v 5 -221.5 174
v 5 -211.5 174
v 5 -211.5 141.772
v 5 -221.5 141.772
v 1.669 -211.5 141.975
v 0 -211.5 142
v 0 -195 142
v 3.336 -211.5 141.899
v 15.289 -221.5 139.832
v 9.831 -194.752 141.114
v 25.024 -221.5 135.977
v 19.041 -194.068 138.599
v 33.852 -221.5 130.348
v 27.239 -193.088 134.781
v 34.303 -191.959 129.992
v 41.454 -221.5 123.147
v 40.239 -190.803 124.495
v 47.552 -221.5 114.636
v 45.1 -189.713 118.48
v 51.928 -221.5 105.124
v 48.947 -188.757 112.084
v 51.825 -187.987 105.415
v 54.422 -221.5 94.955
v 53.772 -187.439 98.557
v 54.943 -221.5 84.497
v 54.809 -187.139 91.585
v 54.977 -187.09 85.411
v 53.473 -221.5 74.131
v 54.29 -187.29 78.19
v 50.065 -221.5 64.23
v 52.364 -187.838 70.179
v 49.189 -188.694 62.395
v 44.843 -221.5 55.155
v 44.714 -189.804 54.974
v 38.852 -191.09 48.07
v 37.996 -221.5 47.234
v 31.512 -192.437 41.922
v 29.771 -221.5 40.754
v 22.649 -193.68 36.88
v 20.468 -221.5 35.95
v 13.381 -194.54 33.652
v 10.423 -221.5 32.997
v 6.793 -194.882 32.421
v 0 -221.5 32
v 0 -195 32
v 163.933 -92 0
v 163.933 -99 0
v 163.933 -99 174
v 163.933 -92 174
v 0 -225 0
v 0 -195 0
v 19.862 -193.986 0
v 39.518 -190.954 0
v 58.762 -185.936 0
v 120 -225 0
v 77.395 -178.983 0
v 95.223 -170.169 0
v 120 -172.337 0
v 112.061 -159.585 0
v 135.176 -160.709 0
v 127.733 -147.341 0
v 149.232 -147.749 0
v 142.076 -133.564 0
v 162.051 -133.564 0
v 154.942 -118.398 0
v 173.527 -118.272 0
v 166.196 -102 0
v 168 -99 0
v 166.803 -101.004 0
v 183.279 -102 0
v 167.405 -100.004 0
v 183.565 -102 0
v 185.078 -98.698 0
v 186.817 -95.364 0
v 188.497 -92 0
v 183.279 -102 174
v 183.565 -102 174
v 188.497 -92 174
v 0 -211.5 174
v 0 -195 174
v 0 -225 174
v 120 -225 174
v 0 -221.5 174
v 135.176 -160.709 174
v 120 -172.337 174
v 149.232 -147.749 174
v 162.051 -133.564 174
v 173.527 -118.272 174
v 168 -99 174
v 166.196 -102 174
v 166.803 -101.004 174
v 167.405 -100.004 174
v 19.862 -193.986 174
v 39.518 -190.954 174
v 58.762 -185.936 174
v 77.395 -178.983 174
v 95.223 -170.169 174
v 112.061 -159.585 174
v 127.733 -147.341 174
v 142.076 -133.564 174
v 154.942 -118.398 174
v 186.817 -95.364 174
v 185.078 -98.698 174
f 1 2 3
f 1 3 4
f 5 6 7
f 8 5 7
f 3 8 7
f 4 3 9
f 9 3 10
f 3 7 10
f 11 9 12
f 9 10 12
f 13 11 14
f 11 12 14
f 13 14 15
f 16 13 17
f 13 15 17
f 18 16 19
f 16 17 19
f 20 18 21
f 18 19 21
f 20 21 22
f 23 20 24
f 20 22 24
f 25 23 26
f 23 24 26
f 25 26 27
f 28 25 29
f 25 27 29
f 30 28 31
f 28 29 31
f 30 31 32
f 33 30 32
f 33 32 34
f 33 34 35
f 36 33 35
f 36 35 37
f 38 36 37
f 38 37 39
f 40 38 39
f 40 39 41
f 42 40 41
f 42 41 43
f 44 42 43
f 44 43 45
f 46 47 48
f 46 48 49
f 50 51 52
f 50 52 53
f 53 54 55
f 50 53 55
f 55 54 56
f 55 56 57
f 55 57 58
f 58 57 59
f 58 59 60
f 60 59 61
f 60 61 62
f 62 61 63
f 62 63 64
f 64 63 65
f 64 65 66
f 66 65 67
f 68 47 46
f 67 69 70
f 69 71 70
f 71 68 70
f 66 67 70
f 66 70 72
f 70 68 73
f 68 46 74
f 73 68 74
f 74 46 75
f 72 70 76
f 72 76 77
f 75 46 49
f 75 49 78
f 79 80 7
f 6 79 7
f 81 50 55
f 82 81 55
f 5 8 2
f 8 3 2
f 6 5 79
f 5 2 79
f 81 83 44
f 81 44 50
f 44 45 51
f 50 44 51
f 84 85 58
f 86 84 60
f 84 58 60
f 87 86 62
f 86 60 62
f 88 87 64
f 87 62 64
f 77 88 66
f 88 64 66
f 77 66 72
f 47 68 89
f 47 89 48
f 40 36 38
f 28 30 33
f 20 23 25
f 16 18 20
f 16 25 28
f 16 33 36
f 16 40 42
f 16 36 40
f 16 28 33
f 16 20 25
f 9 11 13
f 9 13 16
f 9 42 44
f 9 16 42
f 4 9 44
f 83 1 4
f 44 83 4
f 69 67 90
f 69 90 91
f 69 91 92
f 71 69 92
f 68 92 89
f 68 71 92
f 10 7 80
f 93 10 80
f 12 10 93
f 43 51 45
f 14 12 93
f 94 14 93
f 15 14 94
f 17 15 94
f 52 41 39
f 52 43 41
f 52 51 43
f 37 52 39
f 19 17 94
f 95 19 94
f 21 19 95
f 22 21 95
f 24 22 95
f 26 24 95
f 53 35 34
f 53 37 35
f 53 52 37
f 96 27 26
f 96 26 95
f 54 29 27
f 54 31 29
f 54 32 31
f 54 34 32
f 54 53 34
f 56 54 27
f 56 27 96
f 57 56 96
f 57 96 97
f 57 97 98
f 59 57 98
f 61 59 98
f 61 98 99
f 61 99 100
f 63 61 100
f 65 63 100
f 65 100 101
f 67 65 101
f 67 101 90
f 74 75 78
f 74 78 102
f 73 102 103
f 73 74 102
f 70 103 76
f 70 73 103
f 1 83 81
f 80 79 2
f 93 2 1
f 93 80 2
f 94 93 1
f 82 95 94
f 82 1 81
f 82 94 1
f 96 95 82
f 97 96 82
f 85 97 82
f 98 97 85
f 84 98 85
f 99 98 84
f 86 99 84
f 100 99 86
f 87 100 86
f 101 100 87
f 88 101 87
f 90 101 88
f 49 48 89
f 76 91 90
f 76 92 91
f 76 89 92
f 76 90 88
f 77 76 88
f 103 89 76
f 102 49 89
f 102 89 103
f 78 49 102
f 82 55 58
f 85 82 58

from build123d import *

# Parameters (mm, degrees)
SKETCH_1_R          = 210
SKETCH_1_R_2        = 203
EXTRUDE_2_DEPTH     = 174
EXTRUDE_START       = -174
EXTRUDE_4_DEPTH     = 174
CUT_EXTRUDE_1_DEPTH = 654
EXTRUDE_5_DEPTH     = 174
EXTRUDE_6_DEPTH     = 174
EXTRUDE_7_DEPTH     = 174
EXTRUDE_8_DEPTH     = 174
EXTRUDE_9_DEPTH     = 174
SKETCH_11_R         = 55
CUT_EXTRUDE_4_DEPTH = 221.5
CUT_EXTRUDE_5_DEPTH = 87
SKETCH_13_W         = 252.379443355
SKETCH_13_H         = 197.496269512
CUT_EXTRUDE_6_DEPTH = 244


with BuildPart() as part:
    # 草图1 → 凸台-拉伸2 (new body)
    with BuildSketch(Plane.XY):
        Circle(SKETCH_1_R)
        Circle(SKETCH_1_R_2, mode=Mode.SUBTRACT)
    extrude(amount=EXTRUDE_2_DEPTH)

    # 草图2 → 凸台-拉伸4 (add)
    with BuildSketch(Plane.XY.offset(174).offset(EXTRUDE_START)):
        with BuildLine():
            Line((-170.735431044, -102), (-173.735431044, -102))
            Line((-173.735431044, -102), (-175.513532242, -102))
            ThreePointArc((-175.513532242, -102), (-174.63092392, -103.50381834), (-173.735431044, -105))
            Line((-173.735431044, -105), (-170.735431044, -105))
            Line((-170.735431044, -105), (-170.735431044, -102))
        make_face()
        with BuildLine():
            ThreePointArc((173.735431044, -105), (174.63092392, -103.50381834), (175.513532242, -102))
            Line((175.513532242, -102), (173.735431044, -102))
            Line((173.735431044, -102), (170.735431044, -102))
            Line((170.735431044, -102), (170.735431044, -105))
            Line((170.735431044, -105), (173.735431044, -105))
        make_face()
    extrude(amount=EXTRUDE_4_DEPTH)

    # 草图3 → 切除-拉伸1 (cut)
    with BuildSketch(Plane.XY.offset(174)):
        Polygon((-170.735431044, -102), (238.333646515, -102), (254.334169784, 272.292523591), (-334.569415043, 221.85110305), (-306.830562533, -102), align=None)
    extrude(amount=-CUT_EXTRUDE_1_DEPTH, mode=Mode.SUBTRACT)

    # 草图5 → 凸台-拉伸5 (add)
    with BuildSketch(Plane.XY.offset(174).offset(EXTRUDE_START)):
        with BuildLine():
            Line((-120, -209.75), (-10.243900624, -209.75))
            ThreePointArc((-10.243900624, -209.75), (-67.755470707, -198.769203322), (-120, -172.336879396))
            Line((-120, -172.336879396), (-120, -209.75))
        make_face()
        with BuildLine():
            ThreePointArc((120, -172.336879396), (67.755470707, -198.769203322), (10.243900624, -209.75))
            Line((10.243900624, -209.75), (120, -209.75))
            Line((120, -209.75), (120, -172.336879396))
        make_face()
    extrude(amount=EXTRUDE_5_DEPTH)

    # 草图6 → 凸台-拉伸6 (add)
    with BuildSketch(Plane.XY.offset(174).offset(EXTRUDE_START)):
        with BuildLine():
            Line((-175.513532242, -102), (-166.195667814, -102))
            ThreePointArc((-166.195667814, -102), (0, -195), (166.195667814, -102))
            Line((166.195667814, -102), (175.513532242, -102))
            ThreePointArc((175.513532242, -102), (0, -203), (-175.513532242, -102))
        make_face()
    extrude(amount=EXTRUDE_6_DEPTH)

    # 草图7 → 凸台-拉伸7 (add)
    with BuildSketch(Plane.XY.offset(174).offset(EXTRUDE_START)):
        with BuildLine():
            Line((-166.933126535, -92), (-166.933126535, -95))
            Line((-166.933126535, -95), (-170.293863659, -95))
            ThreePointArc((-170.293863659, -95), (0, -195), (170.293863659, -95))
            Line((170.293863659, -95), (166.933126535, -95))
            Line((166.933126535, -95), (166.933126535, -92))
            Line((166.933126535, -92), (171.933126535, -92))
            Line((171.933126535, -92), (188.496850106, -92))
            ThreePointArc((188.496850106, -92), (0, -209.75), (-188.496850106, -92))
            Line((-188.496850106, -92), (-171.933126535, -92))
            Line((-171.933126535, -92), (-166.933126535, -92))
        make_face()
    extrude(amount=EXTRUDE_7_DEPTH)

    # 草图8 → 凸台-拉伸8 (add)
    with BuildSketch(Plane(origin=(0, 0, 0), x_dir=(-1, 0, 0), z_dir=(0, 0, -1))):
        with BuildLine():
            Line((166.933126535, -92), (163.933126535, -92))
            Line((163.933126535, -92), (163.933126535, -99))
            Line((163.933126535, -99), (168, -99))
            ThreePointArc((168, -99), (169.158755456, -97.006780447), (170.293863659, -95))
            Line((170.293863659, -95), (166.933126535, -95))
            Line((166.933126535, -95), (166.933126535, -92))
        make_face()
        with BuildLine():
            Line((-166.933126535, -95), (-170.293863659, -95))
            ThreePointArc((-170.293863659, -95), (-169.158755456, -97.006780447), (-168, -99))
            Line((-168, -99), (-163.933126535, -99))
            Line((-163.933126535, -99), (-163.933126535, -92))
            Line((-163.933126535, -92), (-166.933126535, -92))
            Line((-166.933126535, -92), (-166.933126535, -95))
        make_face()
    extrude(amount=-EXTRUDE_8_DEPTH)

    # 草图9 → 凸台-拉伸9 (add)
    with BuildSketch(Plane.XY.offset(174).offset(EXTRUDE_START)):
        with BuildLine():
            ThreePointArc((10.243900624, -209.75), (5.123475383, -209.937490697), (0, -210))
            Line((0, -210), (0, -225))
            Line((0, -225), (18.007375678, -225))
            Line((18.007375678, -225), (120, -225))
            Line((120, -225), (120, -209.75))
            Line((120, -209.75), (10.243900624, -209.75))
        make_face()
        with BuildLine():
            Line((0, -225), (0, -210))
            ThreePointArc((0, -210), (-5.123475383, -209.937490697), (-10.243900624, -209.75))
            Line((-10.243900624, -209.75), (-120, -209.75))
            Line((-120, -209.75), (-120, -225))
            Line((-120, -225), (0, -225))
        make_face()
    extrude(amount=EXTRUDE_9_DEPTH)

    # 草图11 → 切除-拉伸4 (cut)
    with BuildSketch(Plane(origin=(0, 0, 0), x_dir=(1, 0, 0), z_dir=(0, 1, 0))):
        with Locations(Location((0, -87, 0), (0, 0, 270))):
            Circle(SKETCH_11_R)
    extrude(amount=-CUT_EXTRUDE_4_DEPTH, mode=Mode.SUBTRACT)

    # 草图10 → 切除-拉伸5 (cut)
    with BuildSketch(Plane.XY.offset(174)):
        Polygon((5, -221.5), (-5, -221.5), (-5, -211.5), (0, -211.5), (5, -211.5), align=None)
    extrude(amount=-CUT_EXTRUDE_5_DEPTH, mode=Mode.SUBTRACT)

    # 草图13 → 切除-拉伸6 (cut)
    with BuildSketch(Plane(origin=(0, 0, 0), x_dir=(0, 0, -1), z_dir=(1, 0, 0))):
        with Locations((-79.30804003, -159.33156324)):
            Rectangle(SKETCH_13_W, SKETCH_13_H)
    extrude(amount=-CUT_EXTRUDE_6_DEPTH, mode=Mode.SUBTRACT)


solid = part.part
